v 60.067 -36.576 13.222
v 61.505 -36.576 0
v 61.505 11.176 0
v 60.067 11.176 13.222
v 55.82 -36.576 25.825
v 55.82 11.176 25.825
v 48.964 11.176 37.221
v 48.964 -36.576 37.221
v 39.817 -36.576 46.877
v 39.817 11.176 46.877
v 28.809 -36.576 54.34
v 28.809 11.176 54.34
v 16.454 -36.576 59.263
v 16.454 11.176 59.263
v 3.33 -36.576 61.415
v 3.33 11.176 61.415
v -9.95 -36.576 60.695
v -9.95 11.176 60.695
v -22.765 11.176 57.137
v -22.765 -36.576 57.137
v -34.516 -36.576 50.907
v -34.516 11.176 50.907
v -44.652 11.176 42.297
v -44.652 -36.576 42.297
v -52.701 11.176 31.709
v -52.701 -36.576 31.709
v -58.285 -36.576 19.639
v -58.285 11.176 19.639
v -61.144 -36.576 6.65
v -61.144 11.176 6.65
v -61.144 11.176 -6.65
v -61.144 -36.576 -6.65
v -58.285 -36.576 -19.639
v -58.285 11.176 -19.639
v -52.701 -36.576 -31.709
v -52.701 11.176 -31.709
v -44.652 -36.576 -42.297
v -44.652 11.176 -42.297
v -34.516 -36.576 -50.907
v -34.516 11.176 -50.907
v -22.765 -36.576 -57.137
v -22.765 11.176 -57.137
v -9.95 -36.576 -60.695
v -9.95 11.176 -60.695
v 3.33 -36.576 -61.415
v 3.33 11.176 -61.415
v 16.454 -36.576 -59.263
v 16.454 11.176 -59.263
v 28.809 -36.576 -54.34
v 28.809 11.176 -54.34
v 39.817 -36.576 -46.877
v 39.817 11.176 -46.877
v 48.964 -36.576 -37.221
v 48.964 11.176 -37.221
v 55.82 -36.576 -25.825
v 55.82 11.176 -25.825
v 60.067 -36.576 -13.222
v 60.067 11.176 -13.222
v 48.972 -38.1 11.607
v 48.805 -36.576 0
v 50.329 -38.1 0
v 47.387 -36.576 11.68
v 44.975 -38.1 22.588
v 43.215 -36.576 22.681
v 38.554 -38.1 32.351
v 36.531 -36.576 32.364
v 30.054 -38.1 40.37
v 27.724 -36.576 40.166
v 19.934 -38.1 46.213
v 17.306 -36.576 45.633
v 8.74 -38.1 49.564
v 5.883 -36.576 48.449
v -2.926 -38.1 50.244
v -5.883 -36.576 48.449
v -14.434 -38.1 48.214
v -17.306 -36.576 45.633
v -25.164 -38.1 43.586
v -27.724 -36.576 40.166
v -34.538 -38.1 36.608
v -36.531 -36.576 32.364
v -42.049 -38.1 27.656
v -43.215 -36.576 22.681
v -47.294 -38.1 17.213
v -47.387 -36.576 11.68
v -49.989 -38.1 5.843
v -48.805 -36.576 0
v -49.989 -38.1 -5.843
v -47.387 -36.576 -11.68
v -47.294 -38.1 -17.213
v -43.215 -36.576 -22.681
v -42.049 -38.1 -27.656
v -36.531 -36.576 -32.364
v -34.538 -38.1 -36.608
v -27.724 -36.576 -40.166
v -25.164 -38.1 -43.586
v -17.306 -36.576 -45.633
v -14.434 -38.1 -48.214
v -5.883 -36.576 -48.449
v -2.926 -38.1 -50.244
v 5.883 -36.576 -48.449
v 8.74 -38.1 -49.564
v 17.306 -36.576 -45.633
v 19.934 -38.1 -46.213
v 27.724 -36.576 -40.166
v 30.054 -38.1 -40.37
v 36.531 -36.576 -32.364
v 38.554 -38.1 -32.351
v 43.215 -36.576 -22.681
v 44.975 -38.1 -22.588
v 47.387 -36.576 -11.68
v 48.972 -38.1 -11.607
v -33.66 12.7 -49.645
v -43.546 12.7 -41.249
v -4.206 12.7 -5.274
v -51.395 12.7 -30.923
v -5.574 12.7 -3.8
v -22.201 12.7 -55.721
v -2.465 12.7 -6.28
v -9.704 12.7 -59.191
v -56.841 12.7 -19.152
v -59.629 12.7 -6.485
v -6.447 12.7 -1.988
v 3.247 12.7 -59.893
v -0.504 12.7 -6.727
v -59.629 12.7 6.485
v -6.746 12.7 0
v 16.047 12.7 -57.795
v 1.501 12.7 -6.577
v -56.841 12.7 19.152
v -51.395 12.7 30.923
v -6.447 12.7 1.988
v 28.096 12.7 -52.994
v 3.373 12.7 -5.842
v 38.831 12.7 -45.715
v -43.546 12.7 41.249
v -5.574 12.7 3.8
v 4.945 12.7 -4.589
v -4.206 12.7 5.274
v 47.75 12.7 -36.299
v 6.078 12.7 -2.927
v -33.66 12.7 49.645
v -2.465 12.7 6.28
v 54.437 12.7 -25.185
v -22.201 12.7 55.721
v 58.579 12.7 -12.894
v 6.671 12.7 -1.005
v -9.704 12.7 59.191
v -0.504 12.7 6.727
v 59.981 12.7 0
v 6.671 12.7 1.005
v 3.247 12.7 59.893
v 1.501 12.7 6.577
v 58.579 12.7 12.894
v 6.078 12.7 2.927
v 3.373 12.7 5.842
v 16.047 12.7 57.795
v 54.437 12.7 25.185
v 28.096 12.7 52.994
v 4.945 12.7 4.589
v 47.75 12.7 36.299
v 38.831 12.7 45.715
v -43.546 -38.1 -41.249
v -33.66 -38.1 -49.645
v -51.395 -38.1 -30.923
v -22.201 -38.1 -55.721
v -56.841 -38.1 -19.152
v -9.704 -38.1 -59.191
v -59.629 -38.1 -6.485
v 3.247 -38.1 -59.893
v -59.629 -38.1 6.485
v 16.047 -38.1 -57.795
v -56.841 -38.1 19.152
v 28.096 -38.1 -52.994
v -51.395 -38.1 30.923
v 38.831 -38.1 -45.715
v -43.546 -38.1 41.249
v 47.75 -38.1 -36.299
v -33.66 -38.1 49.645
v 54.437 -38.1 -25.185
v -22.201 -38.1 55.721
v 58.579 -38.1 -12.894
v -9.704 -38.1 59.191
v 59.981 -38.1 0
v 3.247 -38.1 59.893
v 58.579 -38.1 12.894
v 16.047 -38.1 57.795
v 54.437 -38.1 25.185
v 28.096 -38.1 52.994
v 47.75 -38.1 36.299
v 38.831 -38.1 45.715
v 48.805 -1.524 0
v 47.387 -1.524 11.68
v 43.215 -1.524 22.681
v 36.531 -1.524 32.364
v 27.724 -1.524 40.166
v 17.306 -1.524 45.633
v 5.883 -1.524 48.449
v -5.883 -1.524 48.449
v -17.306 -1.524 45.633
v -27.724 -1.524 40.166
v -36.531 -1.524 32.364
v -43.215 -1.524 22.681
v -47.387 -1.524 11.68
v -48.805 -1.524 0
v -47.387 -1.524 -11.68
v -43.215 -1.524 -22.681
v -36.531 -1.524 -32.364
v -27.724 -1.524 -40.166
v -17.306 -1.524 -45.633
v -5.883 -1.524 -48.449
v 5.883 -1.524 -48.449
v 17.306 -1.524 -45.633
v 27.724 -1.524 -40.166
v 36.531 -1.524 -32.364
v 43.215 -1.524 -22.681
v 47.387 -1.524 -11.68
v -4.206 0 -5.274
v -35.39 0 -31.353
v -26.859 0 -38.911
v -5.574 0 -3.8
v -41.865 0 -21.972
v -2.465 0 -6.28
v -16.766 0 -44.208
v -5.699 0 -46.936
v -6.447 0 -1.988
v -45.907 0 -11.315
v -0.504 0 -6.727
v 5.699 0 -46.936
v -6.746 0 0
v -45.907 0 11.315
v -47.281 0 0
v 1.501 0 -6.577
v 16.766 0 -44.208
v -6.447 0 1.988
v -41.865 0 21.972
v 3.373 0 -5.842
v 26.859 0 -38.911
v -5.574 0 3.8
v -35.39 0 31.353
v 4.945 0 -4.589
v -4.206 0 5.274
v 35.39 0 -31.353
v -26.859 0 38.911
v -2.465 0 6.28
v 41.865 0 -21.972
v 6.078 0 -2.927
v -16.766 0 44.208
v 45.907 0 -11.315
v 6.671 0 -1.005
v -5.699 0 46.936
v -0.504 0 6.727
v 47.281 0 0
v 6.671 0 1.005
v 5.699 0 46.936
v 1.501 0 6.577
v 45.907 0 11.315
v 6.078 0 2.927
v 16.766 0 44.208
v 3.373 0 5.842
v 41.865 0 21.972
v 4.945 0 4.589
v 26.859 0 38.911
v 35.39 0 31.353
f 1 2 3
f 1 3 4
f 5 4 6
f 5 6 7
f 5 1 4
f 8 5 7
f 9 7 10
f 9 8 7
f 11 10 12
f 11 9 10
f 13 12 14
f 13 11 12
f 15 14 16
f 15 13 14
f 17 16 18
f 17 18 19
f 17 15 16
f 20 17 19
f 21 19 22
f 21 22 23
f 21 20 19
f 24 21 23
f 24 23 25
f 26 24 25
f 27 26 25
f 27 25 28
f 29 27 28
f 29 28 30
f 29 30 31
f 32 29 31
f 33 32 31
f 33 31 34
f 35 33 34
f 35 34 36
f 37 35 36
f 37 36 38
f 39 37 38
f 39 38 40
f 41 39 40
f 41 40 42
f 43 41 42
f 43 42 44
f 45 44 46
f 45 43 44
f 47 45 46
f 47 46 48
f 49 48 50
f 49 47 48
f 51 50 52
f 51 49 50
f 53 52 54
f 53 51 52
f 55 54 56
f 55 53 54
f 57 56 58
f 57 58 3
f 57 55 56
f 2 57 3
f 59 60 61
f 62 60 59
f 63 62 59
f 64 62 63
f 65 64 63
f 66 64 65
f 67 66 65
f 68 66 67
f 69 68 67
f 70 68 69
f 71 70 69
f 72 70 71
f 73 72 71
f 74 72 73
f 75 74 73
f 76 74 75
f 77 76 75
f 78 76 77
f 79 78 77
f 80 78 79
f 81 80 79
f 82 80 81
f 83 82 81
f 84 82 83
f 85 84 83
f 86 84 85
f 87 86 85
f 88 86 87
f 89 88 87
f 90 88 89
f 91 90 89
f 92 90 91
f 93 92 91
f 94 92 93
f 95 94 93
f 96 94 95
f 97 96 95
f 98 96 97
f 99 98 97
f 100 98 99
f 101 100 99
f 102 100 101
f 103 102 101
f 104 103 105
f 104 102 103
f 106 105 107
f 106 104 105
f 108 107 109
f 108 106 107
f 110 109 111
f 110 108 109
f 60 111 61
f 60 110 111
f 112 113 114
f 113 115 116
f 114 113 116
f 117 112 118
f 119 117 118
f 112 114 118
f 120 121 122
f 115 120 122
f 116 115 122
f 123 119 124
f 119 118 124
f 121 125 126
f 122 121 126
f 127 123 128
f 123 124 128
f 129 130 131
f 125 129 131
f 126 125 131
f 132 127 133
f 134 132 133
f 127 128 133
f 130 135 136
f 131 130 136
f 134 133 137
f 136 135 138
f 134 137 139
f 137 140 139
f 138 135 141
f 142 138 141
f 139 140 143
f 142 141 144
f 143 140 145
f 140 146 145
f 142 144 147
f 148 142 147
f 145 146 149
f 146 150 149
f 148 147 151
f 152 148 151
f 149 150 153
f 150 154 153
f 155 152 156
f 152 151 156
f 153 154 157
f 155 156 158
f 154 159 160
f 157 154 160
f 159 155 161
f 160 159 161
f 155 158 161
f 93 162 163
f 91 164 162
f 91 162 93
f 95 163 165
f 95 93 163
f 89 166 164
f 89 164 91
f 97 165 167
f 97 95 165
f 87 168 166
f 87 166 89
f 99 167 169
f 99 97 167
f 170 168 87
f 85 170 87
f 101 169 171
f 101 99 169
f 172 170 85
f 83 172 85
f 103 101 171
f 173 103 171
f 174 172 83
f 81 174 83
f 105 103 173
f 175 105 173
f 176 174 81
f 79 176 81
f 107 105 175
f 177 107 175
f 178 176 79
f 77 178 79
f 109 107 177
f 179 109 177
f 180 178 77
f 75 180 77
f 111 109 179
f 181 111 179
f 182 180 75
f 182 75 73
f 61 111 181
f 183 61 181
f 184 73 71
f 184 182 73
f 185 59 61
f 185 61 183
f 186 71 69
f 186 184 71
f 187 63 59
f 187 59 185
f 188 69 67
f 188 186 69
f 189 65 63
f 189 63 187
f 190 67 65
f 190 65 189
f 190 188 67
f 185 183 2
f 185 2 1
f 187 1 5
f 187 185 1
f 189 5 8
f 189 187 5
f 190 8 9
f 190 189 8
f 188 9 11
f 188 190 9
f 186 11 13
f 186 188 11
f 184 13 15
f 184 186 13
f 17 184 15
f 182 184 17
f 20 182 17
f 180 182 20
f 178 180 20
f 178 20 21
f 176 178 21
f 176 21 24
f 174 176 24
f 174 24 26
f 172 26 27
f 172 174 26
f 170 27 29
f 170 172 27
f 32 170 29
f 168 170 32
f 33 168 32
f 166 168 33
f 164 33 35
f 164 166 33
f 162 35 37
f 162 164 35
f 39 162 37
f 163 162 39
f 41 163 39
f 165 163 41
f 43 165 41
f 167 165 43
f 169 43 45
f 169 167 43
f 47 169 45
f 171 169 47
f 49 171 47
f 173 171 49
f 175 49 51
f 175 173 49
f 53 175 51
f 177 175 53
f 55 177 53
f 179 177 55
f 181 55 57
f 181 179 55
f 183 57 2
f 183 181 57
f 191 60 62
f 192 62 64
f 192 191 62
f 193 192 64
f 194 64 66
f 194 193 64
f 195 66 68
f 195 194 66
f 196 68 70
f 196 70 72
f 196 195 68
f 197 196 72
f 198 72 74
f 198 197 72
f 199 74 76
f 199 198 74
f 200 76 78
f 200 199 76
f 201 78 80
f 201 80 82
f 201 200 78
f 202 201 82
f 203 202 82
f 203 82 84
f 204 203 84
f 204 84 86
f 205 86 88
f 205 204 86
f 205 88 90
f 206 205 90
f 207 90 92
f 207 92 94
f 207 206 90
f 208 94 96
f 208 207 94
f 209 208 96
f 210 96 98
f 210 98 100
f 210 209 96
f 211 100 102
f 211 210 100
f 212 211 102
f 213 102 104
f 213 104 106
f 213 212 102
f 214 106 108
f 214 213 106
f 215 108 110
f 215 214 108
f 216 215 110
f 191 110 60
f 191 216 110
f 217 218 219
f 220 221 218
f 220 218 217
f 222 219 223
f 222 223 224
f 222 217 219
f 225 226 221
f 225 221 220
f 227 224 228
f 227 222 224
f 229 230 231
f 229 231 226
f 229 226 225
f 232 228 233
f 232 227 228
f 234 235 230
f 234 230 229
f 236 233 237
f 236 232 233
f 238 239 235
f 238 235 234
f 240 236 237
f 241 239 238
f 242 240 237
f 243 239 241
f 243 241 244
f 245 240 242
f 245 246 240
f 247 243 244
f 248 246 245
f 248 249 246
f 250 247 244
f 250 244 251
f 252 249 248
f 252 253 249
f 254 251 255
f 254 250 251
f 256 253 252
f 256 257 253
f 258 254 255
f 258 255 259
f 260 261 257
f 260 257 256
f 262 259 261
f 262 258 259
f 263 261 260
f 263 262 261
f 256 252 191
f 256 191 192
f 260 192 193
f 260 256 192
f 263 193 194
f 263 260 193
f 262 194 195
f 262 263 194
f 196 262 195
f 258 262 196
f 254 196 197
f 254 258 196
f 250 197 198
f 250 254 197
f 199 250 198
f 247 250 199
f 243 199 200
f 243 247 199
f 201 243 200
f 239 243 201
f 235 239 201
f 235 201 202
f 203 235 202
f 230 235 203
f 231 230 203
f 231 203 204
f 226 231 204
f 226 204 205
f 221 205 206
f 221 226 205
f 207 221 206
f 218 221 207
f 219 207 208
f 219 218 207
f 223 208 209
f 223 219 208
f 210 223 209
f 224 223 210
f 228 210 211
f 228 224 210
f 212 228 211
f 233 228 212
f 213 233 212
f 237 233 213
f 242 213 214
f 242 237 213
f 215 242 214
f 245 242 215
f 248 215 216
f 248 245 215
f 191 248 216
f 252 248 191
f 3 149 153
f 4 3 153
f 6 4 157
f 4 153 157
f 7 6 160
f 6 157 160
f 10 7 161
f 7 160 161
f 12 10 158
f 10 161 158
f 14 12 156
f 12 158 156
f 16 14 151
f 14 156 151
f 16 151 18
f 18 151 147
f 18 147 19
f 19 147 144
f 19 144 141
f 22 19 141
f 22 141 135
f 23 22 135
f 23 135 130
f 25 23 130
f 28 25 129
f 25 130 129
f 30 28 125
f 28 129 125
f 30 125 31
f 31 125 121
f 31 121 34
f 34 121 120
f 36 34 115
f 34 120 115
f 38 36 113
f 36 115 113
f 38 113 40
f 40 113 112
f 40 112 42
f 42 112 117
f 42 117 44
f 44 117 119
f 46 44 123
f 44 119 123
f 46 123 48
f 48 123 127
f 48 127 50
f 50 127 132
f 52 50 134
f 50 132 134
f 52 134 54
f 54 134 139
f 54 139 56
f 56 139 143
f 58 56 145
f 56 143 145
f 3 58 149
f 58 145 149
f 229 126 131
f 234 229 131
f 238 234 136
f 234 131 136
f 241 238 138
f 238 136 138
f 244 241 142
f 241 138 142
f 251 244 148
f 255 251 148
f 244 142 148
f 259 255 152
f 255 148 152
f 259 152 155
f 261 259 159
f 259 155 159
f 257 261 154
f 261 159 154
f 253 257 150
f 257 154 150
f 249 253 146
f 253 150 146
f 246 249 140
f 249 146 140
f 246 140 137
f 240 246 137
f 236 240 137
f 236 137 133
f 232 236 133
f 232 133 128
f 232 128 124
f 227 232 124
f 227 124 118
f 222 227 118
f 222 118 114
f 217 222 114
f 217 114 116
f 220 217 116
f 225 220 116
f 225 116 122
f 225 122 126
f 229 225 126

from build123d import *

# Parameters (mm, degrees)
F0_R     = 61.50483
F0_R_2   = 48.80483
F1_DEPTH = 38.1
F2_DEPTH = 12.7
F3_D     = 13.49248
F3_DEPTH = 31.2674
F3_TIP   = 4.0535499425
F4_SIZE  = 1.524


with BuildPart() as f1:
    # F0 (on Front) → F1 (new body)
    with BuildSketch(Plane.XZ):
        Circle(F0_R)
        Circle(F0_R_2, mode=Mode.SUBTRACT)
    extrude(amount=F1_DEPTH)

    # F0 (on Front) → F2 (join)
    with BuildSketch(Plane.XZ):
        Circle(F0_R)
        Circle(F0_R_2, mode=Mode.SUBTRACT)
        Circle(F0_R_2)
    extrude(amount=-F2_DEPTH)

    # F3
    with Locations(Plane.XZ):
        with Locations((0, 0)):
            Hole(F3_D / 2, depth=F3_DEPTH)
            with Locations((0, 0, -(F3_DEPTH + F3_TIP / 2))):  # 118° drill point
                Cone(0, F3_D / 2, F3_TIP, mode=Mode.SUBTRACT)

    # F4
    f4_edges = [f1.edges().sort_by_distance(p)[0] for p in [
        (61.50483, -19.05, 0),
        (-61.50483, 0, 0),
        (-61.50483, -38.1, 0),
        (61.50483, 6.35, 0),
        (-61.50483, 12.7, 0),
        (48.80483, -19.05, 0),
        (-48.80483, 0, 0),
        (-48.80483, -38.1, 0),
    ]]
    chamfer(f4_edges, length=F4_SIZE)


solid = f1.part
